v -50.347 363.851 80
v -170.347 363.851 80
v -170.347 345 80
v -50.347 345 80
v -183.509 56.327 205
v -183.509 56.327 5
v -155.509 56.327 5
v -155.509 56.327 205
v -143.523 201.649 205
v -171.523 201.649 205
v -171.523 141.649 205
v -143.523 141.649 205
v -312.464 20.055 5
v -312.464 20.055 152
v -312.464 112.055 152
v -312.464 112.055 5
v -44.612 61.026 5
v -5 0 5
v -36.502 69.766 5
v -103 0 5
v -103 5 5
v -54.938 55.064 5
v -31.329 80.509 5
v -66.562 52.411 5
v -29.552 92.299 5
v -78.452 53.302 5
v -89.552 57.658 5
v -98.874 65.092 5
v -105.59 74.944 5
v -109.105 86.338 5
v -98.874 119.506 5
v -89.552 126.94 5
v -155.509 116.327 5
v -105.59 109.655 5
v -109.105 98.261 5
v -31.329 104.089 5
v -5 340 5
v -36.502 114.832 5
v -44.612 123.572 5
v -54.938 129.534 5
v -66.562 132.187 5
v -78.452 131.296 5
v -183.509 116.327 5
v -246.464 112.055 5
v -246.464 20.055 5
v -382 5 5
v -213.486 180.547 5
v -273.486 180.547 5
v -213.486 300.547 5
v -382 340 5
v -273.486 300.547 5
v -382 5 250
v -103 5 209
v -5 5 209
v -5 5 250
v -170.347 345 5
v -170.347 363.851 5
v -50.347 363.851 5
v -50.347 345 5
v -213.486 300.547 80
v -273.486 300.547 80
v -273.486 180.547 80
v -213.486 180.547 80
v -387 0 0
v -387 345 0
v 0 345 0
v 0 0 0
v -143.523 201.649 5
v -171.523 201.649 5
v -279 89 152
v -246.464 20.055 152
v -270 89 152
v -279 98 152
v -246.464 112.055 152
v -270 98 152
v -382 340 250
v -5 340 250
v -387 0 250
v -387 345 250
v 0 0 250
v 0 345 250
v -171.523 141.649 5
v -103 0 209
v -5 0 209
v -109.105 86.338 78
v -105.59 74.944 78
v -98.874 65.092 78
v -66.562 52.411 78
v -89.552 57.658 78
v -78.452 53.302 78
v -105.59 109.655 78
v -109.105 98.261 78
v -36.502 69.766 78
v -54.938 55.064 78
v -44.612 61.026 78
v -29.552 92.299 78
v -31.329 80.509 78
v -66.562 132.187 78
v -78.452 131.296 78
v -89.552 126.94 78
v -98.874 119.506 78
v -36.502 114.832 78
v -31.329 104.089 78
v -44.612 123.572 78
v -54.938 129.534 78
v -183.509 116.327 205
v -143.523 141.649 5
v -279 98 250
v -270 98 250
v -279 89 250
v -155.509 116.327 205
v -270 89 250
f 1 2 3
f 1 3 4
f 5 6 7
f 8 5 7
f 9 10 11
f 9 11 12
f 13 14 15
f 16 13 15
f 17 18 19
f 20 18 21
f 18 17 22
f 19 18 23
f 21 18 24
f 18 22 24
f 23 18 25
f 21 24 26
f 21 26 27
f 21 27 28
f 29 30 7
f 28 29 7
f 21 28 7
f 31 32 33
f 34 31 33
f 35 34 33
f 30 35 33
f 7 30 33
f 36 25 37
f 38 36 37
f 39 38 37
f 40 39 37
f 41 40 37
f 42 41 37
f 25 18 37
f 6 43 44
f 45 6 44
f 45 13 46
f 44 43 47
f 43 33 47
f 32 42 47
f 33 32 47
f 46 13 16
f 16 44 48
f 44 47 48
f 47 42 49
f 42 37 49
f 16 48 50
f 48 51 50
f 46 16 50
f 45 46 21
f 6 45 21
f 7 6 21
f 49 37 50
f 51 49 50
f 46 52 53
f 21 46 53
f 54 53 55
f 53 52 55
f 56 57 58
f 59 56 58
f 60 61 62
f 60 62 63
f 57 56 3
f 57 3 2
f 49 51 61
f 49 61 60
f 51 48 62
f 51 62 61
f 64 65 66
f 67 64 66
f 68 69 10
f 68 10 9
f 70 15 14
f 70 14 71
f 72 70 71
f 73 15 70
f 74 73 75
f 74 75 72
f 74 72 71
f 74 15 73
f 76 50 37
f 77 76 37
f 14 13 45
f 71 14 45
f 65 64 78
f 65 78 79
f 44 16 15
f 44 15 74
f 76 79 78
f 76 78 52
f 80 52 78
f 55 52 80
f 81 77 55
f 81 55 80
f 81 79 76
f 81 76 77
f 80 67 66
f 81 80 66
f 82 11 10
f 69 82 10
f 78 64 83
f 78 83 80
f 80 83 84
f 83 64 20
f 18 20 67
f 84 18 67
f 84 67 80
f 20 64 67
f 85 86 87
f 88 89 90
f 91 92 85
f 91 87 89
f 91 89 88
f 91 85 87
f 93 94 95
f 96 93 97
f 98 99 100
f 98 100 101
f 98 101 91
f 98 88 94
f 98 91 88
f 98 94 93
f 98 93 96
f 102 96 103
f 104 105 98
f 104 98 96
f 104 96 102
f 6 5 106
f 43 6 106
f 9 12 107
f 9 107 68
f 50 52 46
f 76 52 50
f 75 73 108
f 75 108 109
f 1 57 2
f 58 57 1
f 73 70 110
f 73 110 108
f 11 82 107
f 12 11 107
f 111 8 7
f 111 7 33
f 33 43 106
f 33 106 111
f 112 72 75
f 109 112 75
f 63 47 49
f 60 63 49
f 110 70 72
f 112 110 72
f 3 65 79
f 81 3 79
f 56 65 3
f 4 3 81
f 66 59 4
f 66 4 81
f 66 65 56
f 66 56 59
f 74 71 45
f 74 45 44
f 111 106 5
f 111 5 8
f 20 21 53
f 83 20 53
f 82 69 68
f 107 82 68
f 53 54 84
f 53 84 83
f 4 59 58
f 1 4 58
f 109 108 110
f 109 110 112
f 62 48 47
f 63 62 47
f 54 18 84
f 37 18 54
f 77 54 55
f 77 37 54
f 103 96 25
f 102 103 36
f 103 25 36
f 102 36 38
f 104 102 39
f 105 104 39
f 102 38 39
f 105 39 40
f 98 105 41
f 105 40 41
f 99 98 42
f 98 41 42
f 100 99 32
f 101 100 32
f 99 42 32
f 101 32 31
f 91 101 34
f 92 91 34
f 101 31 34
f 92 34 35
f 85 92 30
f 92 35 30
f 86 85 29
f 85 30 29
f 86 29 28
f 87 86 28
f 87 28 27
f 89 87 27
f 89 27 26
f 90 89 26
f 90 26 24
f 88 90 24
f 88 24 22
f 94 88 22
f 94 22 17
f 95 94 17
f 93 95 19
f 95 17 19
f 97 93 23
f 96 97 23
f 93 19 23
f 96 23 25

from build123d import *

# Parameters (mm, degrees)
F0_W      = 387
F0_H      = 345
F1_DEPTH  = 250
F2_W      = 377
F2_H      = 335
F3_DEPTH  = 245
F4_W      = 98
F4_H      = 204
F5_DEPTH  = 25
F6_W      = 9
F6_H      = 9
F7_DEPTH  = 245
F8_W      = 60
F8_H      = 120
F9_DEPTH  = 75
F10_W     = 120
F10_H     = 23.8507700859
F11_DEPTH = 75
F12_W     = 28
F12_H     = 60
F13_DEPTH = 200
F14_W     = 28
F14_H     = 60
F15_DEPTH = 200
F16_R     = 40
F17_DEPTH = 73
F18_W     = 66
F18_H     = 92
F18_W_2   = 9
F18_H_2   = 9
F19_DEPTH = 147


with BuildPart() as f1:
    # F0 (on Top) → F1 (new body)
    with BuildSketch(Plane.XY):
        with Locations((-193.5, 172.5)):
            Rectangle(F0_W, F0_H)
    extrude(amount=F1_DEPTH)

    # F2 (on face) → F3 (cut)
    with BuildSketch(Plane.XY.offset(250)):
        with Locations((-193.5, 172.5)):
            Rectangle(F2_W, F2_H)
    extrude(amount=-F3_DEPTH, mode=Mode.SUBTRACT)

    # F4 (on face) → F5 (cut)
    with BuildSketch(Plane(origin=(0, 5, 0), x_dir=(-1, 0, 0), z_dir=(0, 1, 0))):
        with Locations((54, 107)):
            Rectangle(F4_W, F4_H)
    extrude(amount=-F5_DEPTH, mode=Mode.SUBTRACT)

    # F6 (on face) → F7 (join)
    with BuildSketch(Plane.XY.offset(5)):
        with Locations((-274.5, 93.5)):
            Rectangle(F6_W, F6_H)
    extrude(amount=F7_DEPTH)

    # F8 (on face) → F9 (join)
    with BuildSketch(Plane.XY.offset(5)):
        with Locations((-243.4864774462, 240.5474260449)):
            Rectangle(F8_W, F8_H)
    extrude(amount=F9_DEPTH)

    # F10 (on face) → F11 (join)
    with BuildSketch(Plane.XY.offset(5)):
        with Locations((-110.3469633506, 351.925385043)):
            Rectangle(F10_W, F10_H)
    extrude(amount=F11_DEPTH)

    # F14 (on face) → F15 (join)
    with BuildSketch(Plane.XY.offset(5)):
        with Locations((-169.5094383758, 86.3268319517)):
            Rectangle(F14_W, F14_H)
    extrude(amount=F15_DEPTH)

    # F16 (on face) → F17 (join)
    with BuildSketch(Plane.XY.offset(5)):
        with Locations((-69.5516467094, 92.2992378473)):
            Circle(F16_R)
    extrude(amount=F17_DEPTH)

    # F18 (on face) → F19 (join)
    with BuildSketch(Plane.XY.offset(5)):
        with Locations((-279.4643215769, 66.0552727059)):
            Rectangle(F18_W, F18_H)
        with Locations((-274.5, 93.5)):
            Rectangle(F18_W_2, F18_H_2, mode=Mode.SUBTRACT)
    extrude(amount=F19_DEPTH)


with BuildPart() as f13:
    # F12 (on face) → F13 (new body)
    with BuildSketch(Plane.XY.offset(5)):
        with Locations((-157.5231286956, 171.648837626)):
            Rectangle(F12_W, F12_H)
    extrude(amount=F13_DEPTH)


solid = Compound([f1.part, f13.part])
